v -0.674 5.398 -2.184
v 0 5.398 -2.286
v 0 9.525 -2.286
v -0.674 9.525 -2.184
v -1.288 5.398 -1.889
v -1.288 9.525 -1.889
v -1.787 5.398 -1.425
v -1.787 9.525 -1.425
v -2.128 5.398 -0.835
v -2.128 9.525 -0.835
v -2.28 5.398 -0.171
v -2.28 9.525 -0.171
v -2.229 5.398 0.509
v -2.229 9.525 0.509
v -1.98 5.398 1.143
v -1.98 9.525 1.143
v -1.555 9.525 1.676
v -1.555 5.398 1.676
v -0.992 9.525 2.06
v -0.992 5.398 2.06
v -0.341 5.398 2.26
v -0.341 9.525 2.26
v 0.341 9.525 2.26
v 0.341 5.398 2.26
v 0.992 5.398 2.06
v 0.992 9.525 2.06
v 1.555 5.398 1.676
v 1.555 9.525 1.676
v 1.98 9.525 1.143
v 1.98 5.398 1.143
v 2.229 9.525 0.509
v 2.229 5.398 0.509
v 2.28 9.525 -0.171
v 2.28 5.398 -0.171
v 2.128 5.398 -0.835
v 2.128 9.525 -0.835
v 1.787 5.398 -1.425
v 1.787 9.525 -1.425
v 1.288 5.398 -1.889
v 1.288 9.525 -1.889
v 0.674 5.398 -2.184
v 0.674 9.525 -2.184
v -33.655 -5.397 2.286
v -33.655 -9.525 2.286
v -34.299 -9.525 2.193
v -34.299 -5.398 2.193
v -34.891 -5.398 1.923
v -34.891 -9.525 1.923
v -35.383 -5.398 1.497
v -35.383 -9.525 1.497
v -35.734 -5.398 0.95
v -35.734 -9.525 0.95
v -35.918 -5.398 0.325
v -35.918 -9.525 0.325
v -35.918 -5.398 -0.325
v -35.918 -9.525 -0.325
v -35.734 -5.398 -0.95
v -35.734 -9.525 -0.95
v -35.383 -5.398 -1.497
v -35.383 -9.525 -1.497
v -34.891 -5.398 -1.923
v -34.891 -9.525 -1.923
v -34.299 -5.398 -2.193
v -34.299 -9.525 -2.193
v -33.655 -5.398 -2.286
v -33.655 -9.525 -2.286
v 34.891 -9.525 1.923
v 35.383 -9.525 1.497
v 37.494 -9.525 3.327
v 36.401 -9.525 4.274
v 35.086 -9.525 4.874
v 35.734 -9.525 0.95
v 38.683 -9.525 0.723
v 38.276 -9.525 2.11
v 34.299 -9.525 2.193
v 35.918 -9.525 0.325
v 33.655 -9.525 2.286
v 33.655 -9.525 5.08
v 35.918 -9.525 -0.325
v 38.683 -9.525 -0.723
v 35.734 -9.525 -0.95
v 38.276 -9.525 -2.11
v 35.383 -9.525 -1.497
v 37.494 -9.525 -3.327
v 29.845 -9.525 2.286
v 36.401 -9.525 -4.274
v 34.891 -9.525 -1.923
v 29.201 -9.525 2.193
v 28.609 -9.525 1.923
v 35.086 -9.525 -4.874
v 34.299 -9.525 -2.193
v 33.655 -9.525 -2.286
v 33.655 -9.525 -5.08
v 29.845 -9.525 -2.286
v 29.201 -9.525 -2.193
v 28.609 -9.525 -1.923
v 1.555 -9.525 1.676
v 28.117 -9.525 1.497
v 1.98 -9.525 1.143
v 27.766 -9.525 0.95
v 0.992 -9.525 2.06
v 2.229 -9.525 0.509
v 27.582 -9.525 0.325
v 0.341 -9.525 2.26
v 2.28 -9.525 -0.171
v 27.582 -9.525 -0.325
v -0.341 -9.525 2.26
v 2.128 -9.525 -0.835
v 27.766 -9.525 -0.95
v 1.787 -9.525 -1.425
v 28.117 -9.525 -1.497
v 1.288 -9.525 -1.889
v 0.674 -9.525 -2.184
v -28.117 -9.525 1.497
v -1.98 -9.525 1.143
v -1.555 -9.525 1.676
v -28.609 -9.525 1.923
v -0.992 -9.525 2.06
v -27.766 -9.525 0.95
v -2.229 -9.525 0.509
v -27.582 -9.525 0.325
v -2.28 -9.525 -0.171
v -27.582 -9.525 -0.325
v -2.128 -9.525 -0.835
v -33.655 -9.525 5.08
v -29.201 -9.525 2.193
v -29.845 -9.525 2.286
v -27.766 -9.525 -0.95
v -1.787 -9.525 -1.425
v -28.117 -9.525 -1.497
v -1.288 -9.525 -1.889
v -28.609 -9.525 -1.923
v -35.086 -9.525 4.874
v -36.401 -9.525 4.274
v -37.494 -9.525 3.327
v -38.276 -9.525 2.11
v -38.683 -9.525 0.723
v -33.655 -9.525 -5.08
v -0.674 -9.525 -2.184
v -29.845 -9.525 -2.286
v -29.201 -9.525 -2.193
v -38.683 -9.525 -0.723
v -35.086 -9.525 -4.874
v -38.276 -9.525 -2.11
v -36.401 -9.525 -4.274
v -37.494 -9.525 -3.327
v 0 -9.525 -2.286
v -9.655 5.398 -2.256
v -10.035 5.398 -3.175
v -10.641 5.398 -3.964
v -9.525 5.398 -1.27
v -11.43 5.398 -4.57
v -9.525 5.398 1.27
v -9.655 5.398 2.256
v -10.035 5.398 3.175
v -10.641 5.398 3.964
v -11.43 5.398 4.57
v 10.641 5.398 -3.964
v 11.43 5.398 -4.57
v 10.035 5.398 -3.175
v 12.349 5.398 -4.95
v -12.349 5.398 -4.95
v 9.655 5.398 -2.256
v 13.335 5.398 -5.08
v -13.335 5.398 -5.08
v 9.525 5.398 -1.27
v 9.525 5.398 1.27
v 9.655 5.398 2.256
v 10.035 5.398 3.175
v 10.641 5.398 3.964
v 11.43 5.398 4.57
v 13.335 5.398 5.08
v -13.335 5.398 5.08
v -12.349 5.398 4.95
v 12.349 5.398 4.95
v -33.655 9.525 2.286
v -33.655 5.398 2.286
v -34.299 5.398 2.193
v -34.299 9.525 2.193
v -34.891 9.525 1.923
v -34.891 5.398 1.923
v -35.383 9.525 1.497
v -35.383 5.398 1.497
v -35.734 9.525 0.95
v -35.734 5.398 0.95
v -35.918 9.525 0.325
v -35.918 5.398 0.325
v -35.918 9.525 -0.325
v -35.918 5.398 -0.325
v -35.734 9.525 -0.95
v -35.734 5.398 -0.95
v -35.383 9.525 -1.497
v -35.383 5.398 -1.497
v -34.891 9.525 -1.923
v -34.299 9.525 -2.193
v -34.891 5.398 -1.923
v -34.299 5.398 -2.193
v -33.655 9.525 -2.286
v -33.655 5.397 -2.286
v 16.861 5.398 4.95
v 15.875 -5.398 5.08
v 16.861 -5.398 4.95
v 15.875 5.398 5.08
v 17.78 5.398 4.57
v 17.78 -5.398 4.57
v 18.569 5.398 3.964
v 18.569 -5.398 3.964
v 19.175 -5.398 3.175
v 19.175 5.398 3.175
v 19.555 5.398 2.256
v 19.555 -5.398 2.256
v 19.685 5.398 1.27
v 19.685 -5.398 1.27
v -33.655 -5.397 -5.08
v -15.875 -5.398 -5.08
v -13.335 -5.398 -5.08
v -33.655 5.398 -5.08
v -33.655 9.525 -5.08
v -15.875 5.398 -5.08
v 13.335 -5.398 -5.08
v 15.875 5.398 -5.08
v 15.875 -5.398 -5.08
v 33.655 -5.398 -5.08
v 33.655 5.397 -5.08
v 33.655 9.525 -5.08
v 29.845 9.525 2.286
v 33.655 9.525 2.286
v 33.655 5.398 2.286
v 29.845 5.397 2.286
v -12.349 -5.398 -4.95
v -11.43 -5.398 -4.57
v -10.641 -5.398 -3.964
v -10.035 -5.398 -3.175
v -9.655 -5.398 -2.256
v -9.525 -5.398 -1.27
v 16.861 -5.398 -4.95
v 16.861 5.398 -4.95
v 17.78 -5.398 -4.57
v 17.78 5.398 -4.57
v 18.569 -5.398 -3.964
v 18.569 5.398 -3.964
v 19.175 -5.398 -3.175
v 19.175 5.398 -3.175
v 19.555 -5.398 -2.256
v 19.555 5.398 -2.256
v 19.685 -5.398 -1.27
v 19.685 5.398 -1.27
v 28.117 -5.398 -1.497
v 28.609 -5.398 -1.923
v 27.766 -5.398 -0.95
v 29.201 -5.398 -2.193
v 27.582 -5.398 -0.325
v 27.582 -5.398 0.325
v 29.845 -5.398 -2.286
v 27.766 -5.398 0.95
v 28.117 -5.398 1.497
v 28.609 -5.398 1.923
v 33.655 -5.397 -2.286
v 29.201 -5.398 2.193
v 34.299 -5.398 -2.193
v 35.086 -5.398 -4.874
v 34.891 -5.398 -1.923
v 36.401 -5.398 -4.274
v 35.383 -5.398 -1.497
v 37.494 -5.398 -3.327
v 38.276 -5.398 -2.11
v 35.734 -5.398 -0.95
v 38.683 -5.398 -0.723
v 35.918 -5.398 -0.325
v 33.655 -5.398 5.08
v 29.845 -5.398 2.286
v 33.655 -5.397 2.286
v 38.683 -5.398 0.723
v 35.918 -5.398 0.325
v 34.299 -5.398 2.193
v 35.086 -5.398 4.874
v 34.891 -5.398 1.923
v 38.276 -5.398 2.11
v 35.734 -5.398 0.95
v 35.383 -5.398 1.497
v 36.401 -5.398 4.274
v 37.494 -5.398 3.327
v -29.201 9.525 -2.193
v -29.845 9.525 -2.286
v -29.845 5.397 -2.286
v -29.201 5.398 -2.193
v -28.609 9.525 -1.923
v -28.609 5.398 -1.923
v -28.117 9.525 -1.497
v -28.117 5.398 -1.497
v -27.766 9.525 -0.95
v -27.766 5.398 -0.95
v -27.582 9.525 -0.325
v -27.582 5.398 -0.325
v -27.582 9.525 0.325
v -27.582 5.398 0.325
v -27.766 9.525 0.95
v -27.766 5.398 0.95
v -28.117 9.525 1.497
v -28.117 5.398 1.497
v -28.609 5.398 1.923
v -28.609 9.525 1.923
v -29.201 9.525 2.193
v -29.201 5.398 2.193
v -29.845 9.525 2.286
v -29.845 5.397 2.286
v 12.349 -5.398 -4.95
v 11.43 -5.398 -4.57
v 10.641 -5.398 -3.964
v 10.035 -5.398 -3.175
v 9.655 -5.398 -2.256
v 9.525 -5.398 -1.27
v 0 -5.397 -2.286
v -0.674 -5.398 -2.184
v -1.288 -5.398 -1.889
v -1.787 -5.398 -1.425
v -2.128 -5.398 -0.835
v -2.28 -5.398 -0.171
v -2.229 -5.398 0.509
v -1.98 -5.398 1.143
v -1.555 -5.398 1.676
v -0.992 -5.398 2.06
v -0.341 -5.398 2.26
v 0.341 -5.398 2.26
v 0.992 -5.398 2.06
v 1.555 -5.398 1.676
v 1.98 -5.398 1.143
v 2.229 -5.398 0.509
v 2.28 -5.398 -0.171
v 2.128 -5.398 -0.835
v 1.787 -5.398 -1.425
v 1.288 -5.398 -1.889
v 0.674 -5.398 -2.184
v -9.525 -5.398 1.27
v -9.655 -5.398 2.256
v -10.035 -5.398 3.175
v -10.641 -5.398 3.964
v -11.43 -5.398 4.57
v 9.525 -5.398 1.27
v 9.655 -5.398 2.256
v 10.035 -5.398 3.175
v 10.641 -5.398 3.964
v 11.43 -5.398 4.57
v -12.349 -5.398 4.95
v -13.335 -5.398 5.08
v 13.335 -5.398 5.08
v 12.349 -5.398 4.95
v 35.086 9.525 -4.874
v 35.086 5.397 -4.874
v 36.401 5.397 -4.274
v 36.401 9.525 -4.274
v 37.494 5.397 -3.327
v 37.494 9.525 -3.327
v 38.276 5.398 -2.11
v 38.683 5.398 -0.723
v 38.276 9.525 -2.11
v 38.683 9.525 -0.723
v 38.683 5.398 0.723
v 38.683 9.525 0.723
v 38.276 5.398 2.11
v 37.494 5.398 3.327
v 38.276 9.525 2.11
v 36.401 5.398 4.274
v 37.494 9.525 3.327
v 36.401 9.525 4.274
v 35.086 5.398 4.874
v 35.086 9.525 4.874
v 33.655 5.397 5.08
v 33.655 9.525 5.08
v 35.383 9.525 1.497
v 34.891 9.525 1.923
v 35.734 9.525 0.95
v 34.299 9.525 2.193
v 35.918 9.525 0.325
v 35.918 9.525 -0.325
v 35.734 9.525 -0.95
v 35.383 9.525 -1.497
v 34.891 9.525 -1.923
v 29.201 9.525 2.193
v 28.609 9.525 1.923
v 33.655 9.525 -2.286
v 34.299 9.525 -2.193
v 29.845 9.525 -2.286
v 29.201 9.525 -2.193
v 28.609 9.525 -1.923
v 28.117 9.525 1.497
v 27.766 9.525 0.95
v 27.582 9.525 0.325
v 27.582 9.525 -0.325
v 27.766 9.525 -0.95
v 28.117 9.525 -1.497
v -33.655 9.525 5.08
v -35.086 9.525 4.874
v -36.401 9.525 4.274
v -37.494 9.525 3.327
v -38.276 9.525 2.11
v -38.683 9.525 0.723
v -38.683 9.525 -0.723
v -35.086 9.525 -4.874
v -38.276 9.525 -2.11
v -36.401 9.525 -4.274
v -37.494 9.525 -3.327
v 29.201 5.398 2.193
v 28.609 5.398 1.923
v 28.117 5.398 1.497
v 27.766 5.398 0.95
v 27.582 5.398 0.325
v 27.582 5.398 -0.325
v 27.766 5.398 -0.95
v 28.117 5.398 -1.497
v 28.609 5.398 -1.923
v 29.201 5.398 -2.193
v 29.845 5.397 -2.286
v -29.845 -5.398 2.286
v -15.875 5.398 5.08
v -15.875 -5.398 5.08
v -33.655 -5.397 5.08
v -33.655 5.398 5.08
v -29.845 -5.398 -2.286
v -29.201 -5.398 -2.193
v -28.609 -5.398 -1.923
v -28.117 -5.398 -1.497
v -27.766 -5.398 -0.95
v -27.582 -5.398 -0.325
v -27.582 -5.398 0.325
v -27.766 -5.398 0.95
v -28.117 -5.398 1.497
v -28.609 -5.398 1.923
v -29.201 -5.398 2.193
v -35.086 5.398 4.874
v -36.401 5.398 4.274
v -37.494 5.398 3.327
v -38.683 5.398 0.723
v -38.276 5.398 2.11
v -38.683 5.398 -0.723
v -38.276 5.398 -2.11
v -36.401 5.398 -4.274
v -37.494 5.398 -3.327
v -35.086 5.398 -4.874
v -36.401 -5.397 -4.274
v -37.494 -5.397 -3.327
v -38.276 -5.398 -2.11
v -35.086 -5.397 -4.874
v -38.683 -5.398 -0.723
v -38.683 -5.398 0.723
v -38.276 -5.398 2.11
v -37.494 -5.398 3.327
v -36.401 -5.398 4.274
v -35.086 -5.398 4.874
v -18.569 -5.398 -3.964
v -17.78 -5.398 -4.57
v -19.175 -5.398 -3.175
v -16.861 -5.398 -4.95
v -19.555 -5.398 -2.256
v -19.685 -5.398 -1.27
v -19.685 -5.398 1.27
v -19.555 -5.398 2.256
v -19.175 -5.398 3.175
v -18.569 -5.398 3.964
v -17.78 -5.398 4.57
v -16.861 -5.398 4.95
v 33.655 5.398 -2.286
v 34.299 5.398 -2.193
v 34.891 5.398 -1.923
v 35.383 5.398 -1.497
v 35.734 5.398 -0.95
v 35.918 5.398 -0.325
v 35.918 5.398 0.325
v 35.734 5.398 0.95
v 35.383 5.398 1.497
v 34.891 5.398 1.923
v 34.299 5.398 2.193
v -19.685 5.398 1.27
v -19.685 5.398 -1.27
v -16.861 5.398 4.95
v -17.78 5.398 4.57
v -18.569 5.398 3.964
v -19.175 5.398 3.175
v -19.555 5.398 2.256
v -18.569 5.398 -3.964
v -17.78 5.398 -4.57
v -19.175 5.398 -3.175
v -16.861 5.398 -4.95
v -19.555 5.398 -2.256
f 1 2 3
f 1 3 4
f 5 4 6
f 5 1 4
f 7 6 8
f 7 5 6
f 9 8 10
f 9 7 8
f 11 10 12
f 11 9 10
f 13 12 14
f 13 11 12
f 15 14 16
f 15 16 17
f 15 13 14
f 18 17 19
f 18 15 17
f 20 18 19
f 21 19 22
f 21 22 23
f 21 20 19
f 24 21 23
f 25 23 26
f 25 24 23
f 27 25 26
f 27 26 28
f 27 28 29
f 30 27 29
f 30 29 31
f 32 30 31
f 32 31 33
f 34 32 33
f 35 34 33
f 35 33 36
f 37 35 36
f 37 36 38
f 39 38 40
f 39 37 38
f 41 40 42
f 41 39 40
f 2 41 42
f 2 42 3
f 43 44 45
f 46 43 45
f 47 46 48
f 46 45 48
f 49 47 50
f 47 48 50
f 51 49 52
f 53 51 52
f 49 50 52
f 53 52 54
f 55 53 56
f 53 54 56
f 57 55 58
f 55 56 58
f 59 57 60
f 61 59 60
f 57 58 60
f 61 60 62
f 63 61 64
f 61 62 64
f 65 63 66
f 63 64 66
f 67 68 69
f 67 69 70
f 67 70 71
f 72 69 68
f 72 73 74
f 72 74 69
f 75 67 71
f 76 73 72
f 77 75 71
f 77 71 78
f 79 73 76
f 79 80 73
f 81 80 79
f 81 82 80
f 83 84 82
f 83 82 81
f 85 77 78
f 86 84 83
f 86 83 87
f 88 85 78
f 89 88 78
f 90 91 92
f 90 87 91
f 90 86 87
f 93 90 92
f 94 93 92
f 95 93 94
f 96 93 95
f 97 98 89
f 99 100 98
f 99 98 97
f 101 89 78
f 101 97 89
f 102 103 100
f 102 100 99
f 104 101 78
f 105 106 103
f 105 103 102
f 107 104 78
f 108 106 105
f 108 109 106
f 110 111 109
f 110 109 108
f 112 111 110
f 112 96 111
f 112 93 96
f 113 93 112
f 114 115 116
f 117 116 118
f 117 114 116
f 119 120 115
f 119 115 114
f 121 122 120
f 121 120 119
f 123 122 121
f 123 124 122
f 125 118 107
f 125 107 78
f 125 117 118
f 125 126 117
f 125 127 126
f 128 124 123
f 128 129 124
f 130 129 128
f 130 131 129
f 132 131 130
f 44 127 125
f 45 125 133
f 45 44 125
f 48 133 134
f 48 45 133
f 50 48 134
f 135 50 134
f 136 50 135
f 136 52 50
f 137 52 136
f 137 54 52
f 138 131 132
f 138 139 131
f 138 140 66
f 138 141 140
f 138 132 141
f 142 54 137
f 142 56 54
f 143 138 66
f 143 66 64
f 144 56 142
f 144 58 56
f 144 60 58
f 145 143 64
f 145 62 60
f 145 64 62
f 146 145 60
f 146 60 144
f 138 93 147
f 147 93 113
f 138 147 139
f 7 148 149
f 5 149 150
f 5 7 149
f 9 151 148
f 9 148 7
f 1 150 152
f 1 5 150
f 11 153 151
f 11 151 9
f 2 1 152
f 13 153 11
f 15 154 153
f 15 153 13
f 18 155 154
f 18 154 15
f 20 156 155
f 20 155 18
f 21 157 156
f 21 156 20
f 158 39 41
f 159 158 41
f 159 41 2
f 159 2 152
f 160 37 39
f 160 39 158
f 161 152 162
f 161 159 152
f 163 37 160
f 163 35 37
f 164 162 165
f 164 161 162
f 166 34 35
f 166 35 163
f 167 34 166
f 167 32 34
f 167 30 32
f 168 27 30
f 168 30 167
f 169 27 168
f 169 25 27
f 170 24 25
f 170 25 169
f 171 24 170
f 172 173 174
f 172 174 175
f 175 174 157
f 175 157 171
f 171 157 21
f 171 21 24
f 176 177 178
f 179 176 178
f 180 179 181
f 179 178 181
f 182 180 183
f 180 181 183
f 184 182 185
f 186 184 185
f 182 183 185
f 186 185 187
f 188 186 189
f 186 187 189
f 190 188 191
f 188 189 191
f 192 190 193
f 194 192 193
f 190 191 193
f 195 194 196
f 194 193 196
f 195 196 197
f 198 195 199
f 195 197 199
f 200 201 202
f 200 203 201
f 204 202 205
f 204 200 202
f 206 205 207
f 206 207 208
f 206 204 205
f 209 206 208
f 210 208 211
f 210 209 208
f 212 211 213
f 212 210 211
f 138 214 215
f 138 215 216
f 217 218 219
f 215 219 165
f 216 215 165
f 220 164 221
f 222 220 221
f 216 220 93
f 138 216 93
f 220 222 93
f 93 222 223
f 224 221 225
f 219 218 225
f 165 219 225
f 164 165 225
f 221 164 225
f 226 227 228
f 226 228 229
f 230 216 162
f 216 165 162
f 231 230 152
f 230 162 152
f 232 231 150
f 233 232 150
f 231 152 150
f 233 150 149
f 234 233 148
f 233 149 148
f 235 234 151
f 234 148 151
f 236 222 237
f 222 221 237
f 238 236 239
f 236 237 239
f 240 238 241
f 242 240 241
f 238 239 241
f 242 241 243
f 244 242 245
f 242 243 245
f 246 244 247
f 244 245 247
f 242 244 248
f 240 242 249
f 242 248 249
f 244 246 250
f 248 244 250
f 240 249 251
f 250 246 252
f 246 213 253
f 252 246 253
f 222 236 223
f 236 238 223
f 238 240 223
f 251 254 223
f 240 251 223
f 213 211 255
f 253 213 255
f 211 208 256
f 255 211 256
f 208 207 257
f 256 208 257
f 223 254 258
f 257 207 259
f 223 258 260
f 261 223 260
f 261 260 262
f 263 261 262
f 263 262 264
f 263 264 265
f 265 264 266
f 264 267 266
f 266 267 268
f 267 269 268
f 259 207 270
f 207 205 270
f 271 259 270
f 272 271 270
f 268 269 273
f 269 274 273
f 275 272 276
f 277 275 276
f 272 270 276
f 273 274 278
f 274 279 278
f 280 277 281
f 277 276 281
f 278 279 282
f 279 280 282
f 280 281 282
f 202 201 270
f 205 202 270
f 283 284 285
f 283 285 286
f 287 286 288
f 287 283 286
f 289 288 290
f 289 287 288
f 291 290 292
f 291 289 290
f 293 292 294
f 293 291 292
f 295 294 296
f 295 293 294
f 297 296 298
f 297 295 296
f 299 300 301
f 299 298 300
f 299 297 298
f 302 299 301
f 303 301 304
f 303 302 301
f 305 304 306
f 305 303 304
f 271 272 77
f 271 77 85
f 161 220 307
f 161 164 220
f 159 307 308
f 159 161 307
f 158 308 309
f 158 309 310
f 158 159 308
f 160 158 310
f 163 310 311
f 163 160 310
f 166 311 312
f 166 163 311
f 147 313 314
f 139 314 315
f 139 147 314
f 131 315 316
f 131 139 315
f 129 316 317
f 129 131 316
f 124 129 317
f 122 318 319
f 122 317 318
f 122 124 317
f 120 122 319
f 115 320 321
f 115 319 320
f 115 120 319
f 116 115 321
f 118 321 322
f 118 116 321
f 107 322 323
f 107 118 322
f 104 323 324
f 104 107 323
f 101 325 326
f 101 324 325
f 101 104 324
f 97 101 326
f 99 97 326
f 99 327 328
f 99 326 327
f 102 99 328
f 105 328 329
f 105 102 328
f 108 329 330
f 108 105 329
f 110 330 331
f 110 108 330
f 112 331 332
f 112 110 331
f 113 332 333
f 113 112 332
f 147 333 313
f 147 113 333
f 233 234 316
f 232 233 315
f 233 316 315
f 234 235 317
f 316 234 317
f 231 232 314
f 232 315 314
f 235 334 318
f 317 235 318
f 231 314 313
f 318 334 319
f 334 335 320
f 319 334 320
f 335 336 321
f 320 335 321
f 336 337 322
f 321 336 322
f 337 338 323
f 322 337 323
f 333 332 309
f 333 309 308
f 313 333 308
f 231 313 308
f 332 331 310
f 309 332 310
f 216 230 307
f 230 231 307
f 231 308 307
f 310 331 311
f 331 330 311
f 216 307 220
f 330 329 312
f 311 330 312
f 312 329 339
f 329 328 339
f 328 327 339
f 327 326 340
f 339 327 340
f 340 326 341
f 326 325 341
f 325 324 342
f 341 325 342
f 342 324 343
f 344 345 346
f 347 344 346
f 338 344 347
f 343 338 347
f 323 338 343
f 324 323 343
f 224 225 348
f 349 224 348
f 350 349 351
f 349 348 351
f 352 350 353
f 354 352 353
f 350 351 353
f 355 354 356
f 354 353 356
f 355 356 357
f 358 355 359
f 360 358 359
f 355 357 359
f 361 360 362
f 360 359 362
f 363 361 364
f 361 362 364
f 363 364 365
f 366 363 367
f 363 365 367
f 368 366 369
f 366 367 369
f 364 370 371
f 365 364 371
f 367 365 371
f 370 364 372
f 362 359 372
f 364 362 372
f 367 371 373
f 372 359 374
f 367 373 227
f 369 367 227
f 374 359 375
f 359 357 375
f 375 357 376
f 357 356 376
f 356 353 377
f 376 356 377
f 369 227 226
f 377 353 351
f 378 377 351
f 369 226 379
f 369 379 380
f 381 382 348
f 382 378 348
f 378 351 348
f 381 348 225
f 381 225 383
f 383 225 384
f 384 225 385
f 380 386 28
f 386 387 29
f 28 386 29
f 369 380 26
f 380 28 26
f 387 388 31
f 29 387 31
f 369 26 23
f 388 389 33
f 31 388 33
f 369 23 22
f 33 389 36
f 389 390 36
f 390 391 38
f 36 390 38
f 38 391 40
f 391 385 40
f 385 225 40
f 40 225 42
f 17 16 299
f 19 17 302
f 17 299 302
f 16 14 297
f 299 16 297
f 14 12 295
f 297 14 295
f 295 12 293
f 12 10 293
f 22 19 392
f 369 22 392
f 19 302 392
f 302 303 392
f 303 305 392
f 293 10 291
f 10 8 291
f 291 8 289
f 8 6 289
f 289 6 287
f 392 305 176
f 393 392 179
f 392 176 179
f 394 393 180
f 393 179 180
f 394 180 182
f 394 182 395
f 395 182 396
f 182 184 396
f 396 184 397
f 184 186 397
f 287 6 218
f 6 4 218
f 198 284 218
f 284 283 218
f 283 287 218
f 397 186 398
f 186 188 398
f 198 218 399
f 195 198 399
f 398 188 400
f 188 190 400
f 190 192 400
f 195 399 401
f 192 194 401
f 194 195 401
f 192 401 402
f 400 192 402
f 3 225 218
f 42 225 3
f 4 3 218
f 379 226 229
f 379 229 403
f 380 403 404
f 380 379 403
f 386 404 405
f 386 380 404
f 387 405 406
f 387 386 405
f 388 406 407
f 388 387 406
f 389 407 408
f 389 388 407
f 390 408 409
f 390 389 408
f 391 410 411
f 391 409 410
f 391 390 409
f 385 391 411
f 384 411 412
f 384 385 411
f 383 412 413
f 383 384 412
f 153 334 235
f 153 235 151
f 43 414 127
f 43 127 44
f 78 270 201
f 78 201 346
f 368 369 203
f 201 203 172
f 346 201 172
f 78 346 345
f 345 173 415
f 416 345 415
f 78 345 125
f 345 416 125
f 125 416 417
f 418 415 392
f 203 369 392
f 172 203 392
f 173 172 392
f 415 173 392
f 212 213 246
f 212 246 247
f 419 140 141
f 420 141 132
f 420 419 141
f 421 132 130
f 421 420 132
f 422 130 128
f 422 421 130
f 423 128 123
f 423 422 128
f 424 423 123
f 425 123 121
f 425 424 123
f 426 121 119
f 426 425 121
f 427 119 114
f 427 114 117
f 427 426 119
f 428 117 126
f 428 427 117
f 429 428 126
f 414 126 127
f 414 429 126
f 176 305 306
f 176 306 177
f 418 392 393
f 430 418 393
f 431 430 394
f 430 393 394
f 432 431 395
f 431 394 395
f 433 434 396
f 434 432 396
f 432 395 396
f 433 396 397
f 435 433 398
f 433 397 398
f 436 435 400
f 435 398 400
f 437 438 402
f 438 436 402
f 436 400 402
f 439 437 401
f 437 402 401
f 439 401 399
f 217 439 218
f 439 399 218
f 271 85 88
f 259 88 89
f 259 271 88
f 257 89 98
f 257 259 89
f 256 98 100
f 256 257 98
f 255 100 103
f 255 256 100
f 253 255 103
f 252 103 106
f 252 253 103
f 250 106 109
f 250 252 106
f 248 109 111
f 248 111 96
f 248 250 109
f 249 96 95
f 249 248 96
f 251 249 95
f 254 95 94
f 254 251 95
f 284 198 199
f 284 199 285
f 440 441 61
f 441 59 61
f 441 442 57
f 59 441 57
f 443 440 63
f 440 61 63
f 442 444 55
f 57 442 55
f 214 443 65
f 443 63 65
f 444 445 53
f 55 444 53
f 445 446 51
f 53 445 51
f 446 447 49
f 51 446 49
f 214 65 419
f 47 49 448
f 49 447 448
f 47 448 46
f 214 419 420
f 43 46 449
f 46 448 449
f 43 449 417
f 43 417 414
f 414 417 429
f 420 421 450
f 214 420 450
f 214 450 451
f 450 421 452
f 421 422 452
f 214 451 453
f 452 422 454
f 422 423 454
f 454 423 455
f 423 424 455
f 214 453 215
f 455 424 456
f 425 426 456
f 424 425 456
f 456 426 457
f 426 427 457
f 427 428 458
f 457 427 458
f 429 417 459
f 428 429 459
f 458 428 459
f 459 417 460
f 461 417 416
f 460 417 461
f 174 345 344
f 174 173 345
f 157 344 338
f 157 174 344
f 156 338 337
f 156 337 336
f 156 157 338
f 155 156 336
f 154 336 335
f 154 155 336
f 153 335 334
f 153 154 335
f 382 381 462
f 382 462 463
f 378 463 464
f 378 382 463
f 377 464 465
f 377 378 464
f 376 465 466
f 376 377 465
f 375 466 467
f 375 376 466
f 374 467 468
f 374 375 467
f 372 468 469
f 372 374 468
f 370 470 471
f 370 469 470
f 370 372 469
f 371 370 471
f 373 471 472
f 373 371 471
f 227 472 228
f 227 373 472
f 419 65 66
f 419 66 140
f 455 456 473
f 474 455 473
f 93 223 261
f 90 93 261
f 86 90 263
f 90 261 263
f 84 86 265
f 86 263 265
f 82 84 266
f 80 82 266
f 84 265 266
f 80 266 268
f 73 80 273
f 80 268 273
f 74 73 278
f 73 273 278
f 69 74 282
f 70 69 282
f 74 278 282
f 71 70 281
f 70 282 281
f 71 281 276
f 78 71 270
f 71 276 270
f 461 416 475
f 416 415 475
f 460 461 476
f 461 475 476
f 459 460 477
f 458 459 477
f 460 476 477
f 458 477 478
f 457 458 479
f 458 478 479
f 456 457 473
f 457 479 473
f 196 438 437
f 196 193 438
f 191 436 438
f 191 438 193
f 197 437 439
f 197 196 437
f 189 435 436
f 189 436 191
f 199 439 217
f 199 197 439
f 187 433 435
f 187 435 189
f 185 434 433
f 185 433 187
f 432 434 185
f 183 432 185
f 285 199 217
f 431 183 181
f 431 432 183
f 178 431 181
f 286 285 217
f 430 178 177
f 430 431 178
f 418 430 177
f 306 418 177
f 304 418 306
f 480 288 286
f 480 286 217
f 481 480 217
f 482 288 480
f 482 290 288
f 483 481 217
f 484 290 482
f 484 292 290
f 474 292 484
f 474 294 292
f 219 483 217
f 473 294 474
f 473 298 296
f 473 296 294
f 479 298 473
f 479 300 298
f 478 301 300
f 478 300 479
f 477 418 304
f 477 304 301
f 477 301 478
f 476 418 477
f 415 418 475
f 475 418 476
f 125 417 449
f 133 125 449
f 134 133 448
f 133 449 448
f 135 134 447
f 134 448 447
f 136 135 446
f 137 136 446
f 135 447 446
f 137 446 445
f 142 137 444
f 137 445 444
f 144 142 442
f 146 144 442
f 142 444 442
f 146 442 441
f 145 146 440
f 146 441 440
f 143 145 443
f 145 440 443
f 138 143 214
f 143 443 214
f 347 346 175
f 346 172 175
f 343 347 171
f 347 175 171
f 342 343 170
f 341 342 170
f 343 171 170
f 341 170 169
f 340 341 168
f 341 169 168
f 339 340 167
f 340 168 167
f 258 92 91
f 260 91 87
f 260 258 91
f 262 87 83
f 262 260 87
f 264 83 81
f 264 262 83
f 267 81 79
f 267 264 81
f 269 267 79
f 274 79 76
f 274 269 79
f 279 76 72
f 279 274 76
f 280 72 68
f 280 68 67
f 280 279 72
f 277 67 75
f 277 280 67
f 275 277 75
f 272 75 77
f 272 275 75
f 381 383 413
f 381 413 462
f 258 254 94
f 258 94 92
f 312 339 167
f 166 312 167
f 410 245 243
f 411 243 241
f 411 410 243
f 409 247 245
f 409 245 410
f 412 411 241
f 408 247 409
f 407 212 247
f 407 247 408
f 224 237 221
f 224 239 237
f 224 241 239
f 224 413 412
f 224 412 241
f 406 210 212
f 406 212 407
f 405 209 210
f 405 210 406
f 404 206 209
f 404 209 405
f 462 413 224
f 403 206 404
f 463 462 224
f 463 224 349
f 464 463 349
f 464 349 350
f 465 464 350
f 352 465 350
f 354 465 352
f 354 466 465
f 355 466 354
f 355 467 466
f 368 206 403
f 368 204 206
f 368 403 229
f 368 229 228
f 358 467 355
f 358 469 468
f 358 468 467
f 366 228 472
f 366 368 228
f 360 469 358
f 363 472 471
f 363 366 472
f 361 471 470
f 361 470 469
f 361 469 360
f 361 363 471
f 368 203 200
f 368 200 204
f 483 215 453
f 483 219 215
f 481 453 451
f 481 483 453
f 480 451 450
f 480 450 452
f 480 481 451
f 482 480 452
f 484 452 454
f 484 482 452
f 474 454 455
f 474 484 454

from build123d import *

# Parameters (mm, degrees)
SKETCH1_R           = 2.286
BOSS_EXTRUDE1_DEPTH = 9.525
SKETCH3_W           = 19.05
SKETCH3_H           = 10.795
CUT_EXTRUDE1_DEPTH  = 42.162500531
FILLET1_R           = 3.81


with BuildPart() as part:
    # Sketch1 → Boss-Extrude1 (new, symmetric)
    with BuildSketch(Plane(origin=(0, 0, 0), x_dir=(1, 0, 0), z_dir=(0, 1, 0))):
        with BuildLine():
            Line((33.655, -5.08), (-33.655, -5.08))
            ThreePointArc((-33.655, -5.08), (-38.735, 0), (-33.655, 5.08))
            Line((-33.655, 5.08), (33.655, 5.08))
            ThreePointArc((33.655, 5.08), (38.735, 0), (33.655, -5.08))
        make_face()
        with Locations(Location((0, 0, 0), (0, 0, 90))):
            Circle(SKETCH1_R, mode=Mode.SUBTRACT)
        with BuildLine():
            Line((33.655, -2.286), (29.845, -2.286))
            ThreePointArc((29.845, -2.286), (27.559, 0), (29.845, 2.286))
            Line((29.845, 2.286), (33.655, 2.286))
            ThreePointArc((33.655, 2.286), (35.941, 0), (33.655, -2.286))
        make_face(mode=Mode.SUBTRACT)
        with BuildLine():
            Line((-33.655, 2.286), (-29.845, 2.286))
            ThreePointArc((-29.845, 2.286), (-27.559, 0), (-29.845, -2.286))
            Line((-29.845, -2.286), (-33.655, -2.286))
            ThreePointArc((-33.655, -2.286), (-35.941, 0), (-33.655, 2.286))
        make_face(mode=Mode.SUBTRACT)
    extrude(amount=BOSS_EXTRUDE1_DEPTH, both=True)

    # Sketch3 → Cut-Extrude1 (cut, through all)
    with BuildSketch(Plane.XY.offset(5.08)):
        with Locations((-29.21, 0)):
            Rectangle(SKETCH3_W, SKETCH3_H)
        Rectangle(SKETCH3_W, SKETCH3_H)
        with Locations((29.21, 0)):
            Rectangle(SKETCH3_W, SKETCH3_H)
    extrude(amount=-CUT_EXTRUDE1_DEPTH, mode=Mode.SUBTRACT)

    # Fillet1
    fillet1_edges = [part.edges().sort_by_distance(p)[0] for p in [
        (19.685, 0, -5.08),
        (19.685, 0, 5.08),
        (-19.685, 0, 5.08),
        (-19.685, 0, -5.08),
        (-9.525, 0, -5.08),
        (9.525, 0, -5.08),
        (-9.525, 0, 5.08),
        (9.525, 0, 5.08),
    ]]
    fillet(fillet1_edges, radius=FILLET1_R)


solid = part.part
